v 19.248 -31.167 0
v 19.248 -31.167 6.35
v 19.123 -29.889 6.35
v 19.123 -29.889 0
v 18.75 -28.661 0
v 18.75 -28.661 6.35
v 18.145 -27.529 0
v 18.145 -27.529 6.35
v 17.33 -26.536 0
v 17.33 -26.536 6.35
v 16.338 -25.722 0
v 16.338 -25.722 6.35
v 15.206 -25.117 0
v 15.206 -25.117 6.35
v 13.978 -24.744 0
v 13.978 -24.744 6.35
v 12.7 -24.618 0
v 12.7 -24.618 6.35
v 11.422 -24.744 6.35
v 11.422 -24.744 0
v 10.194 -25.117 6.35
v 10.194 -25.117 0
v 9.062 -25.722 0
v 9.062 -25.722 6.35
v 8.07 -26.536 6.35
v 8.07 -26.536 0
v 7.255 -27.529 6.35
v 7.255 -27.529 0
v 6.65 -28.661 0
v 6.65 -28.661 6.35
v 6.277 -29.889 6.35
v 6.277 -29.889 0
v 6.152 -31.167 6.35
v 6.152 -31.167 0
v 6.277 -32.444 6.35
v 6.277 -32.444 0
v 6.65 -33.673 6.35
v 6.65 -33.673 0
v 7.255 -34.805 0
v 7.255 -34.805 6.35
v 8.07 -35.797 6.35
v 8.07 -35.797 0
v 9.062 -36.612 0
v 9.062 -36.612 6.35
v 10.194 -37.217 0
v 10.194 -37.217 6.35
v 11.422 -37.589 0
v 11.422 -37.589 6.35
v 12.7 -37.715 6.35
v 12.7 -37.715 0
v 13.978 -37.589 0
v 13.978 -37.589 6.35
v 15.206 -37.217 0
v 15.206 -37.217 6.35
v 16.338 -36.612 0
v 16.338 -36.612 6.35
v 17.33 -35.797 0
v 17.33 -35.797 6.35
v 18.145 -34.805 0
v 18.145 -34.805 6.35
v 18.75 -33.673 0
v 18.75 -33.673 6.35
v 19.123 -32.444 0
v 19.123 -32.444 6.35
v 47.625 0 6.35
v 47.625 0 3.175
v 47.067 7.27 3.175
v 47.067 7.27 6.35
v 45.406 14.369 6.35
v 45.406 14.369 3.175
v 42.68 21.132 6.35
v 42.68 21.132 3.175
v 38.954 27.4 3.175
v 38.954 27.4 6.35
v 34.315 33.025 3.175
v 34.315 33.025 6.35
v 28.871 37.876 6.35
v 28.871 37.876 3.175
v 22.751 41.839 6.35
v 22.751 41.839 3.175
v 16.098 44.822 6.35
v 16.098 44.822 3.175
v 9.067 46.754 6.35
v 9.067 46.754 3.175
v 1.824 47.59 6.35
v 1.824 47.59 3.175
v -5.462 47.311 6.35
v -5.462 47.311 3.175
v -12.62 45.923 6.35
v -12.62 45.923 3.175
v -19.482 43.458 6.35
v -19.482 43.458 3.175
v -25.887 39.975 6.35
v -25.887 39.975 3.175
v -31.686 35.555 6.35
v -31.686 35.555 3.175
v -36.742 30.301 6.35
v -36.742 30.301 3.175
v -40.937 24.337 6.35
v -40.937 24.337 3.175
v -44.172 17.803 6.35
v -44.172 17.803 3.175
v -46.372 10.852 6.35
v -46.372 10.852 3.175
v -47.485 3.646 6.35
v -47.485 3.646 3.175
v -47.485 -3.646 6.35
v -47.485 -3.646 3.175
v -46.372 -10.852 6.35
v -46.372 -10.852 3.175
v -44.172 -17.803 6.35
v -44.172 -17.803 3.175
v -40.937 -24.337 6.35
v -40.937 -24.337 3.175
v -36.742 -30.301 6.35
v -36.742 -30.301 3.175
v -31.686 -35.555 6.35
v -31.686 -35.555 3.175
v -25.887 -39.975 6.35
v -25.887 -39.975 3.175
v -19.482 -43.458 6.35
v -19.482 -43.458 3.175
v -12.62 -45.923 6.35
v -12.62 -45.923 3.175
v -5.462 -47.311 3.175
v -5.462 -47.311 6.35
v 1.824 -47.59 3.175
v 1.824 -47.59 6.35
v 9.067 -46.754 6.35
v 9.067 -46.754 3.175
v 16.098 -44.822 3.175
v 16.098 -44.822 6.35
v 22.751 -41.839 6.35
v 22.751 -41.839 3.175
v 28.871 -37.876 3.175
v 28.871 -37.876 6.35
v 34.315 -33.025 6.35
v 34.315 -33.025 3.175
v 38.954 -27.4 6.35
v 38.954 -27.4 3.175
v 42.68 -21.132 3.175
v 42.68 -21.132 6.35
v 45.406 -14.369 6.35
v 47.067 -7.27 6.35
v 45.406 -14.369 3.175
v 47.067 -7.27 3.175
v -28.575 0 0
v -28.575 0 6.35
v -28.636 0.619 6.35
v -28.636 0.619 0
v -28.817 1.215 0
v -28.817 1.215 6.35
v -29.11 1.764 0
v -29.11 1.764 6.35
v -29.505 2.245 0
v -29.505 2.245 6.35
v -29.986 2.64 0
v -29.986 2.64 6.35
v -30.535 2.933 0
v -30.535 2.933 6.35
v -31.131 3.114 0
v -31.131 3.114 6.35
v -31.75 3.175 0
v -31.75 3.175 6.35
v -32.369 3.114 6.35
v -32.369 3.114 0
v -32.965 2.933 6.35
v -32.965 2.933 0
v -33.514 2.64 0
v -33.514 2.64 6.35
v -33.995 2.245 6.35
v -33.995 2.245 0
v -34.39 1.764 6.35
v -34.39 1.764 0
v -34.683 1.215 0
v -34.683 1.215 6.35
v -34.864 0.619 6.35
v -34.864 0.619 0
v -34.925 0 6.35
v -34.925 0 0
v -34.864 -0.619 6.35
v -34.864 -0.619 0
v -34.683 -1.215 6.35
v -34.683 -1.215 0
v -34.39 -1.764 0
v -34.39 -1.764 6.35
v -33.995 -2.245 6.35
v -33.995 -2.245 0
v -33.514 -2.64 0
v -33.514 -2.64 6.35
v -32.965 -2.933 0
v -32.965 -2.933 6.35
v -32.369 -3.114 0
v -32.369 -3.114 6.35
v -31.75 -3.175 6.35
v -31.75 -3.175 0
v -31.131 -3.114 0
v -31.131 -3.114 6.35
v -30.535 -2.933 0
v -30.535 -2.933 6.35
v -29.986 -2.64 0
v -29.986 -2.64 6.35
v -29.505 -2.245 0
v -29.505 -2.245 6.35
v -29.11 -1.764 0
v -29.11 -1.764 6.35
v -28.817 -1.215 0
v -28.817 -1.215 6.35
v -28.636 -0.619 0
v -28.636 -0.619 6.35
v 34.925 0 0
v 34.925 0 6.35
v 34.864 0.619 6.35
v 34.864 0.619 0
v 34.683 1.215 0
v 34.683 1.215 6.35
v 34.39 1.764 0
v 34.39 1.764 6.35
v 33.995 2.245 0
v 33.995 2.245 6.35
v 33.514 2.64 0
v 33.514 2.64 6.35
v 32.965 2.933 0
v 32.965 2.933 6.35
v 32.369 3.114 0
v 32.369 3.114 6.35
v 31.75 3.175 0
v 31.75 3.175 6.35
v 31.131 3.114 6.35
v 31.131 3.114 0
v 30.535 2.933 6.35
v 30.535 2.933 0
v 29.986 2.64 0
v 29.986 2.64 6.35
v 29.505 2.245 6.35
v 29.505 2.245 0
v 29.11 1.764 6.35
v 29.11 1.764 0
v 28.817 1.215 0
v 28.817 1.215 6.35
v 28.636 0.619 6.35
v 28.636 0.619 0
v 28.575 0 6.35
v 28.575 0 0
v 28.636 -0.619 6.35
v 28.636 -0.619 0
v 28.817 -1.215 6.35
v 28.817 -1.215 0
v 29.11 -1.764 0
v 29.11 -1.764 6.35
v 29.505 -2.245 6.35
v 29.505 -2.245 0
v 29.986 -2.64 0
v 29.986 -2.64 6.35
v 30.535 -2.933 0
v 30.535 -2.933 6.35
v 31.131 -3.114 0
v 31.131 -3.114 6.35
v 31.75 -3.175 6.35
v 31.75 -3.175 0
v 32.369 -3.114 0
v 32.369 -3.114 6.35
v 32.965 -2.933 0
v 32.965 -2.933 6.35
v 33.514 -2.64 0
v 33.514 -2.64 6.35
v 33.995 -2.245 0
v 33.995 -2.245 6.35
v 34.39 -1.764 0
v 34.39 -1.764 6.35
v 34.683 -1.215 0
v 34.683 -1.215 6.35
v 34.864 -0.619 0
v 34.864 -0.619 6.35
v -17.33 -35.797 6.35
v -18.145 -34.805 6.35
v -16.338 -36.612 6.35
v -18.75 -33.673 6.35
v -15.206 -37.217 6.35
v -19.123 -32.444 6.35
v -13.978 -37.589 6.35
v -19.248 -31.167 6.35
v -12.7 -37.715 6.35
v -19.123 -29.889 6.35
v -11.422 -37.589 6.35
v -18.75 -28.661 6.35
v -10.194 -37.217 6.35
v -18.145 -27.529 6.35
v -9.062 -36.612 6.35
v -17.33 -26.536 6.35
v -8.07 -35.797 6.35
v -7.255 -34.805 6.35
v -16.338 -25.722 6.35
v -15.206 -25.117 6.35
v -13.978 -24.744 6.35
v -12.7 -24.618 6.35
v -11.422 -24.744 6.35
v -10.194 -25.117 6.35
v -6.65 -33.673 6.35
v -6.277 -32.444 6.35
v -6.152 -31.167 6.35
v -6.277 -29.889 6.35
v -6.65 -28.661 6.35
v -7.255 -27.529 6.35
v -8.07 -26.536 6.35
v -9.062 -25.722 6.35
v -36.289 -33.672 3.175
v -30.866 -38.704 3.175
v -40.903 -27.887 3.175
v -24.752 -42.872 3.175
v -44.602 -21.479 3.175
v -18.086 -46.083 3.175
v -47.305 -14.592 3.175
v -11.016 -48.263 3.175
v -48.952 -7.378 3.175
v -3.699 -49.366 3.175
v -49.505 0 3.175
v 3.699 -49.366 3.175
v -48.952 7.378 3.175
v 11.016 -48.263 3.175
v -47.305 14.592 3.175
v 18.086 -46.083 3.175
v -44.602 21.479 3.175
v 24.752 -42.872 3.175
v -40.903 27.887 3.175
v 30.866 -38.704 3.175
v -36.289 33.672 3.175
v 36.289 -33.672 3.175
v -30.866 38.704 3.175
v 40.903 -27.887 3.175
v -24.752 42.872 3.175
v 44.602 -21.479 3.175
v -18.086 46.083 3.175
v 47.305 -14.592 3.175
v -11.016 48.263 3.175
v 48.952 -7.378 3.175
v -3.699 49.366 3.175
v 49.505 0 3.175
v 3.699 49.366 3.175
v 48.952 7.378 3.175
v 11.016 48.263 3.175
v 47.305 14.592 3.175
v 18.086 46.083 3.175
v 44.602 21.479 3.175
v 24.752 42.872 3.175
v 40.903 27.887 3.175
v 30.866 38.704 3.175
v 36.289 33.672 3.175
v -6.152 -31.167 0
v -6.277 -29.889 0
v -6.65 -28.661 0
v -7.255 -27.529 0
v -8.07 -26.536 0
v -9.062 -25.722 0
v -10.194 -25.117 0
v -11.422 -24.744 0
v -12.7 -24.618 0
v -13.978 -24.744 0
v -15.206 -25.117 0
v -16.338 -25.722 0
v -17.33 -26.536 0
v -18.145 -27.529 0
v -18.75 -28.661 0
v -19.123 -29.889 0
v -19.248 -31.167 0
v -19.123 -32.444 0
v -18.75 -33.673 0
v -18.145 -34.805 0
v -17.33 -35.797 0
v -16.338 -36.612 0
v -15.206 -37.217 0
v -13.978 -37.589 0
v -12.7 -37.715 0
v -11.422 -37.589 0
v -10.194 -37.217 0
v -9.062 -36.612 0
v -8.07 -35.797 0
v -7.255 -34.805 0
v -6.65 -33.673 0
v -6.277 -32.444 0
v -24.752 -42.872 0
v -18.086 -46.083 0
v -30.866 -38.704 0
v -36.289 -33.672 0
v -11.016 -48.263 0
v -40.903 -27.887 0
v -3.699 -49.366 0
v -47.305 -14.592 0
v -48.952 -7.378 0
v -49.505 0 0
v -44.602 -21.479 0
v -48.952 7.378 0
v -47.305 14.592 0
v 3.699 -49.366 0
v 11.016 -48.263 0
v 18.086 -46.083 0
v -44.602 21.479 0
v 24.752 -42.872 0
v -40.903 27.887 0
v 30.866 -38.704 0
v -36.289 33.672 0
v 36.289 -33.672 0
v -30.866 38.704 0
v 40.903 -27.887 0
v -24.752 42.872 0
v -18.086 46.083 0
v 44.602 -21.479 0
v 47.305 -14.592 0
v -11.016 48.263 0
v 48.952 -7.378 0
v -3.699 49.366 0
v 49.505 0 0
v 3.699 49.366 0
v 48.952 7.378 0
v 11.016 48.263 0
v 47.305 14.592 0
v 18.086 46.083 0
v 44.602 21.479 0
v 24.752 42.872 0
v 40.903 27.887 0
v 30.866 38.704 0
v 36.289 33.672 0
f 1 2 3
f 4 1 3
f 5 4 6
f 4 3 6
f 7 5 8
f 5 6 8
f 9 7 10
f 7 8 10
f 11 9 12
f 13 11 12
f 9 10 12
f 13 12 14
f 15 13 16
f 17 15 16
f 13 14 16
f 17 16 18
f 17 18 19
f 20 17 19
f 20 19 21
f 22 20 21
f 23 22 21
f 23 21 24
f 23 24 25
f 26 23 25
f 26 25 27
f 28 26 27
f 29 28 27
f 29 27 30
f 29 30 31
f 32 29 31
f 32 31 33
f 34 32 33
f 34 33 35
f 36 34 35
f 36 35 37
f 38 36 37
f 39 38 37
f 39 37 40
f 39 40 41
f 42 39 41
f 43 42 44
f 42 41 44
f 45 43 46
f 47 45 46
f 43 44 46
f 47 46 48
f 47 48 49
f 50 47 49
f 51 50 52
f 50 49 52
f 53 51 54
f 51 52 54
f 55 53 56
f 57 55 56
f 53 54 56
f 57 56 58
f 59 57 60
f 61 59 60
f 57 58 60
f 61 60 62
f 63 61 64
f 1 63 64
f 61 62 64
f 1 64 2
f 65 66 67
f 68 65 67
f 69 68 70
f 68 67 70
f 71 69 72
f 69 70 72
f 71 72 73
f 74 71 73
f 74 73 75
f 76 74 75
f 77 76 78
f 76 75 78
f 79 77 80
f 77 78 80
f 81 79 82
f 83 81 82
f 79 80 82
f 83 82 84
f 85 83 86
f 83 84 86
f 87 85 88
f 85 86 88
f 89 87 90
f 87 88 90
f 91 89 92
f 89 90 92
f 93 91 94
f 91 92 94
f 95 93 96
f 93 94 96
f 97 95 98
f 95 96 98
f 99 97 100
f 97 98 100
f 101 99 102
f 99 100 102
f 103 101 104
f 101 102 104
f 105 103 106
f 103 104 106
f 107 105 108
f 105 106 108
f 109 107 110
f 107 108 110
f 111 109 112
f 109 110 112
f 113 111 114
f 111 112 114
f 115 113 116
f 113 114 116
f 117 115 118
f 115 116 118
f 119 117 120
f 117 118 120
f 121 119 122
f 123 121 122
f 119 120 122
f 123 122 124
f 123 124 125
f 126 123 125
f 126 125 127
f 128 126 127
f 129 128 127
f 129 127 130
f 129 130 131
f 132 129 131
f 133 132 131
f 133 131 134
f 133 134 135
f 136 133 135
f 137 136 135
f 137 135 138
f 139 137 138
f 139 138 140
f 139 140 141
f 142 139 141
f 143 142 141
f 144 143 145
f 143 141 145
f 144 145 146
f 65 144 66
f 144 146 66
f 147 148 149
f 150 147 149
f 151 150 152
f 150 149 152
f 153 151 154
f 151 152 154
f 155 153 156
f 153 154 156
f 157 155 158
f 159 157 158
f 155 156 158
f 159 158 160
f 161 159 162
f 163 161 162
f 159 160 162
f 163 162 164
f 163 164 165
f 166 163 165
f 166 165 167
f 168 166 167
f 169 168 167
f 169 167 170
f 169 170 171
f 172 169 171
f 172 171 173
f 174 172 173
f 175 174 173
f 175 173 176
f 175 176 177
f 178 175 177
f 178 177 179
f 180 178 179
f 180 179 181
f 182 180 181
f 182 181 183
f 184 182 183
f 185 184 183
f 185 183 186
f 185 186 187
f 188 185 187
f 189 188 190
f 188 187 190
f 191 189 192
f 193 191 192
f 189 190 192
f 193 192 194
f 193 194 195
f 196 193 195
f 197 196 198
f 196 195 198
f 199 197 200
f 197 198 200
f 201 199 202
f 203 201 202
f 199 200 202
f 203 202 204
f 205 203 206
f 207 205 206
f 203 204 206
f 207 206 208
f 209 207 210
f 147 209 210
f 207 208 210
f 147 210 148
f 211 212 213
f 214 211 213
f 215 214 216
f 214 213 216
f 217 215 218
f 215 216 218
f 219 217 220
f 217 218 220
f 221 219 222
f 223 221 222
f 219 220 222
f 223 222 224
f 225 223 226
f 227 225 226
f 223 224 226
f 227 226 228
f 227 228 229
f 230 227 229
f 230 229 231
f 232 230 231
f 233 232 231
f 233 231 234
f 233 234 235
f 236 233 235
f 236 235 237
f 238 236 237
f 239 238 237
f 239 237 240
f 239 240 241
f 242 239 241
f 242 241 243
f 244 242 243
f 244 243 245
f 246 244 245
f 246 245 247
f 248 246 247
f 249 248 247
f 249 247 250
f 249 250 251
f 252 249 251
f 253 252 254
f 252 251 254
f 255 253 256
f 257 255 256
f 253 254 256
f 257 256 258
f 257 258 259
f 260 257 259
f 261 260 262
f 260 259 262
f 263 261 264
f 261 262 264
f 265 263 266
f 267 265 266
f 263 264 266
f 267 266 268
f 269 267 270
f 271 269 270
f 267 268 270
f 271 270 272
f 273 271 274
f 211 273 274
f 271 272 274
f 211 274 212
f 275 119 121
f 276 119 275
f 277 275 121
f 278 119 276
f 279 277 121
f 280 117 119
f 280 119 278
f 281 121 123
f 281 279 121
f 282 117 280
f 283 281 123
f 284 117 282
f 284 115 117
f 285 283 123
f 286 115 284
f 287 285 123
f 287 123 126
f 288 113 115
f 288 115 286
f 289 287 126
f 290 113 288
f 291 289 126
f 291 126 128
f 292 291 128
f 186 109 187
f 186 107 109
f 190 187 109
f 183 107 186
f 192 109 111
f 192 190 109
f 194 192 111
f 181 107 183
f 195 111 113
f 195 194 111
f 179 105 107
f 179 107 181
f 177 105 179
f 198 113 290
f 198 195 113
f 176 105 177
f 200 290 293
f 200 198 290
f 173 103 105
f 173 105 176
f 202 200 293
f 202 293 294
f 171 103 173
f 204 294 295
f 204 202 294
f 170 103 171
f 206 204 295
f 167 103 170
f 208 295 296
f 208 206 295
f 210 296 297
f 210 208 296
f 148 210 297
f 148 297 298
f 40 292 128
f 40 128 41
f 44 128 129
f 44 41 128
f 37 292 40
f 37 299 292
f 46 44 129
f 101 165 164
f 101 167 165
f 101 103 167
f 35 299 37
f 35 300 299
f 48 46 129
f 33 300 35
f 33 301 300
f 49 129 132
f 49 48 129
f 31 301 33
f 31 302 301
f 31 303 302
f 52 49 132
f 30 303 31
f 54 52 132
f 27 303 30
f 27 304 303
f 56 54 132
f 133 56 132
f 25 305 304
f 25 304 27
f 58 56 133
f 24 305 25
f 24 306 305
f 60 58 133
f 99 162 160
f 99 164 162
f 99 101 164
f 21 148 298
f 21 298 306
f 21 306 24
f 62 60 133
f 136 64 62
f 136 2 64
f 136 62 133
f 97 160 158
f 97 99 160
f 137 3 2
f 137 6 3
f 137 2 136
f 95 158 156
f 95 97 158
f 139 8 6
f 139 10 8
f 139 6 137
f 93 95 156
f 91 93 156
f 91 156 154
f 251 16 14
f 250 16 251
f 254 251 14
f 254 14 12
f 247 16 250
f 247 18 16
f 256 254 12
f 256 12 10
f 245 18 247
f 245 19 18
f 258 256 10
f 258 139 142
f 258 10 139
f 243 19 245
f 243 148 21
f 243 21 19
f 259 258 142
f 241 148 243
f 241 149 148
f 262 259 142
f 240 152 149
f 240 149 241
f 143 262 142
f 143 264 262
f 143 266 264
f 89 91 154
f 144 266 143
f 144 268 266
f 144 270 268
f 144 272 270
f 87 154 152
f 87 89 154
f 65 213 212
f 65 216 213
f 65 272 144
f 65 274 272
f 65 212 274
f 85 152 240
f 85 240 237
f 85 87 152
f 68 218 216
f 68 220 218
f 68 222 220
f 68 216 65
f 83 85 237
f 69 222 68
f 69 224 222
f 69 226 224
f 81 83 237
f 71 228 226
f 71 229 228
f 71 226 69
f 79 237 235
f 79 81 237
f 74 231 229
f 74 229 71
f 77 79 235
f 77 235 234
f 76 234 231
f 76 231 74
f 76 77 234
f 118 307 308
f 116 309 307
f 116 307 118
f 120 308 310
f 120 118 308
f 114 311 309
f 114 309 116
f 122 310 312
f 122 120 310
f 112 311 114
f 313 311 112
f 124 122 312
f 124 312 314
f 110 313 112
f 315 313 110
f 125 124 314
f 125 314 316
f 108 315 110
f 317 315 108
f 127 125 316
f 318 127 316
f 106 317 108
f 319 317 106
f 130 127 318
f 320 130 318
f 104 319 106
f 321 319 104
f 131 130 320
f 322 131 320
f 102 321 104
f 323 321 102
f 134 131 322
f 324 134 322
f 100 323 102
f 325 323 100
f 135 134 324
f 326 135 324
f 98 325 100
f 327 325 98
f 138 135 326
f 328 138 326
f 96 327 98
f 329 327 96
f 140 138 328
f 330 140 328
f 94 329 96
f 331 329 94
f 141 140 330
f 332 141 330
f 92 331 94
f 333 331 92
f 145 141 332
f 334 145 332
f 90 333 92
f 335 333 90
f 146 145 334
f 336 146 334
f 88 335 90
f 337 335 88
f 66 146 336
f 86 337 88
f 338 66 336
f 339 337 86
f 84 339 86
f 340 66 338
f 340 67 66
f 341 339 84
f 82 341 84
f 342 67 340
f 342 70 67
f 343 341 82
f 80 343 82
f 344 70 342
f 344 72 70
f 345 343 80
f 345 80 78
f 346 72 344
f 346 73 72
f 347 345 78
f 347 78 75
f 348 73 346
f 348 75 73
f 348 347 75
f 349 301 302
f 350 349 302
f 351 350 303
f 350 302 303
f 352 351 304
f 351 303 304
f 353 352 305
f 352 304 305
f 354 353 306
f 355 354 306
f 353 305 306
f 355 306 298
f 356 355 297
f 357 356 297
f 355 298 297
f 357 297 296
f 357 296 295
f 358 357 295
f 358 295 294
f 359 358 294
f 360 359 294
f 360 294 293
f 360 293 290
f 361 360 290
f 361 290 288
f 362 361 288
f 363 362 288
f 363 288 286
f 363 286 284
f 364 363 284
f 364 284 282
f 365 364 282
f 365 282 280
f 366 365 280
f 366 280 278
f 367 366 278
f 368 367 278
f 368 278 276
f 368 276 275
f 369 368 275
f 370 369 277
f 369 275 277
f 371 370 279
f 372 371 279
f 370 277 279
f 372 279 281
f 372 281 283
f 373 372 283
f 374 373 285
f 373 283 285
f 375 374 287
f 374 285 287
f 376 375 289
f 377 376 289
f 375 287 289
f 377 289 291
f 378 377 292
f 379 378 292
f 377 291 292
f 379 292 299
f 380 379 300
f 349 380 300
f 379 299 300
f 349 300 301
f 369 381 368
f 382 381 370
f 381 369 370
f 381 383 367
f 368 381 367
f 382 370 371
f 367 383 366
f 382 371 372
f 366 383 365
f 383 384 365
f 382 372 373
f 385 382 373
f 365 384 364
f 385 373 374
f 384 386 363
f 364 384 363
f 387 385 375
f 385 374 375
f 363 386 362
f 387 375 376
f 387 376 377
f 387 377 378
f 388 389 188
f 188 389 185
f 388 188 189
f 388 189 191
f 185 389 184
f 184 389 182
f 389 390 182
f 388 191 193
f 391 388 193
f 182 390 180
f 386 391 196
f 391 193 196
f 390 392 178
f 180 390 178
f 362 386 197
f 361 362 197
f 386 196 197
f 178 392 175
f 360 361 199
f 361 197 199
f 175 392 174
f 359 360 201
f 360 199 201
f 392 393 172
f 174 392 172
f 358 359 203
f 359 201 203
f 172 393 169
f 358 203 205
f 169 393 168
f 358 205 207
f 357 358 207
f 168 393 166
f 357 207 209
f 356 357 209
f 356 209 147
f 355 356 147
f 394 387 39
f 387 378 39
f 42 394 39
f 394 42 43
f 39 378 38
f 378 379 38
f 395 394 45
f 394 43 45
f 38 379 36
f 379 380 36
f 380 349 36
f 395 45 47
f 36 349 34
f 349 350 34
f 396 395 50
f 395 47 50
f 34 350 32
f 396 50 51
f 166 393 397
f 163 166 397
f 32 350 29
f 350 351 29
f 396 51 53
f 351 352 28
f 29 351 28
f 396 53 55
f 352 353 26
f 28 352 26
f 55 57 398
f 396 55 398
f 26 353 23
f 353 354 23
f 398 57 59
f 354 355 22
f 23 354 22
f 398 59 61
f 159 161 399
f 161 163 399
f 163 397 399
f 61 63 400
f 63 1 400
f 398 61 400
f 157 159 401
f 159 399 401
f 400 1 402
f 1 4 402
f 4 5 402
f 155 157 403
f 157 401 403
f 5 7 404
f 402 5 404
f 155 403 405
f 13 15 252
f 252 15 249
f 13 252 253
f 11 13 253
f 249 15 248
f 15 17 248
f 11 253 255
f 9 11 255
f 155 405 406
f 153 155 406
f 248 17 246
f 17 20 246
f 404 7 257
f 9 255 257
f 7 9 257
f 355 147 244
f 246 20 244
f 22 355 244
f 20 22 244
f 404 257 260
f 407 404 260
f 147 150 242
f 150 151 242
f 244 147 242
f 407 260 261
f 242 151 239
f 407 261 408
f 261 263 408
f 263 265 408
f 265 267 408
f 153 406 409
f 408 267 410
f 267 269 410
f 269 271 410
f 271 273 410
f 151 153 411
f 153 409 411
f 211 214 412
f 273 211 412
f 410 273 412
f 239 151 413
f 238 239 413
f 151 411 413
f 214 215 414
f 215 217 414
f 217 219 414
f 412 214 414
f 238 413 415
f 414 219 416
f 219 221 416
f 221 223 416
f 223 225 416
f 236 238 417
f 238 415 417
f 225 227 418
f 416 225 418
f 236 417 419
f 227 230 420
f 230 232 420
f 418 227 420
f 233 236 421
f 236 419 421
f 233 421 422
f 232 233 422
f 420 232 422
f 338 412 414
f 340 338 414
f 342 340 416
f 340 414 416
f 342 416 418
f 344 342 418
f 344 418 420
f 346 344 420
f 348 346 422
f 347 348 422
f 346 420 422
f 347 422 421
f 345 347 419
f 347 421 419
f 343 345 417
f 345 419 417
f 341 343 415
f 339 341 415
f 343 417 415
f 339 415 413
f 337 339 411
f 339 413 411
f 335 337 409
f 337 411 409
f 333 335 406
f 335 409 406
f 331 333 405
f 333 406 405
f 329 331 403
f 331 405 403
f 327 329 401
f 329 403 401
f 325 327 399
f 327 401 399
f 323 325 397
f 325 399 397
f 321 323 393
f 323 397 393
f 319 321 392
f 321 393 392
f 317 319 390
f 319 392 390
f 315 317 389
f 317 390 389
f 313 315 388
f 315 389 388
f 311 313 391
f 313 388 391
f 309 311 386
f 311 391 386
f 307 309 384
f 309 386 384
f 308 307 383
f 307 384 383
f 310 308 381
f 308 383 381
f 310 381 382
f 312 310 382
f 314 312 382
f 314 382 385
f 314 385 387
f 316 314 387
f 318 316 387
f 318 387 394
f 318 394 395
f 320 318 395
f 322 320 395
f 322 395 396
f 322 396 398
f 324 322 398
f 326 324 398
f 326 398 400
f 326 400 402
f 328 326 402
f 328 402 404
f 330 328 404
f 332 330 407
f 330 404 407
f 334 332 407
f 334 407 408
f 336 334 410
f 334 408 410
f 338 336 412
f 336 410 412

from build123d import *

# Parameters (mm, degrees)
SKETCH1_R           = 49.5046
BOSS_EXTRUDE1_DEPTH = 3.175
SKETCH2_R           = 47.625
BOSS_EXTRUDE2_DEPTH = 3.175
SKETCH3_R           = 6.5484375
SKETCH3_R_2         = 3.175
CUT_EXTRUDE1_DEPTH  = 7.35


with BuildPart() as part:
    # Sketch1 → Boss-Extrude1 (new body)
    with BuildSketch(Plane.XY):
        Circle(SKETCH1_R)
    extrude(amount=BOSS_EXTRUDE1_DEPTH)

    # Sketch2 → Boss-Extrude2 (add)
    with BuildSketch(Plane.XY.offset(3.175)):
        Circle(SKETCH2_R)
    extrude(amount=BOSS_EXTRUDE2_DEPTH)

    # Sketch3 → Cut-Extrude1 (cut, through all)
    with BuildSketch(Plane.XY.offset(6.35)):
        with Locations((-12.7, -31.166793627)):
            Circle(SKETCH3_R)
        with Locations((12.7, -31.166793627)):
            Circle(SKETCH3_R)
        with Locations((-31.75, 0)):
            Circle(SKETCH3_R_2)
        with Locations((31.75, 0)):
            Circle(SKETCH3_R_2)
    extrude(amount=-CUT_EXTRUDE1_DEPTH, mode=Mode.SUBTRACT)


solid = part.part
